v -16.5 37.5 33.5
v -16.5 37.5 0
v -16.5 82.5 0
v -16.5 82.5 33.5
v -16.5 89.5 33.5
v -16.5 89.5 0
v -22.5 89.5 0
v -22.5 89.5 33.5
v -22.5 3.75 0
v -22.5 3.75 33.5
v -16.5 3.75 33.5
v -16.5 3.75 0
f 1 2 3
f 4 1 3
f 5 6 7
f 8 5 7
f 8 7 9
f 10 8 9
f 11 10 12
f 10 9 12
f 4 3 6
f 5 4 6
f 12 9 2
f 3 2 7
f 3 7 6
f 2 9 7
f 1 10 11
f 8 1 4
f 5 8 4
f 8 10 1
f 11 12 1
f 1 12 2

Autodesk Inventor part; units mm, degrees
ref_plane "YZ Plane" through (0, 0, 0) normal (1, 0, 0) x (0, 1, 0)
ref_plane "XZ Plane" through (0, 0, 0) normal (0, 1, 0) x (-1, 0, 0)
ref_plane "Work Plane1" through (0, 0, 0) normal (0, 0, 1) x (1, 0, 0)
sketch "Sketch1" plane through (0, 0, 0) normal (0, 0, 1) x (1, 0, 0)
  line L0 (23.5, 89.5) -> (-23.5, 89.5) projected
  line L1 (-23.5, 89.5) -> (-23.5, 37.5) projected
  arc A0 (-26.5, 34.5) -> (-23.5, 37.5) centre (-26.5, 37.5) ccw projected
  line L2 (-26.5, 34.5) -> (-89, 34.5) projected
  line L3 (-89, 34.5) -> (-89, -69.5) projected
  line L4 (-89, -69.5) -> (-77, -69.5) projected
  arc A1 (-74, -72.5) -> (-77, -69.5) centre (-77, -72.5) ccw projected
  line L5 (-74, -72.5) -> (-74, -89.5) projected
  line L6 (-74, -89.5) -> (74, -89.5) projected
  line L7 (74, -89.5) -> (74, -72.5) projected
  arc A2 (77, -69.5) -> (74, -72.5) centre (77, -72.5) ccw projected
  line L8 (77, -69.5) -> (89, -69.5) projected
  line L9 (89, -69.5) -> (89, 34.5) projected
  line L10 (89, 34.5) -> (26.5, 34.5) projected
  arc A3 (23.5, 37.5) -> (26.5, 34.5) centre (26.5, 37.5) ccw projected
  line L11 (23.5, 37.5) -> (23.5, 89.5) projected
  line L12 (-4.5, 82.5) -> (-4.5, 37.5) projected
  arc A4 (-7.5, 34.5) -> (-4.5, 37.5) centre (-7.5, 37.5) ccw projected
  line L13 (-7.5, 34.5) -> (-13.5, 34.5) projected
  arc A5 (-16.5, 37.5) -> (-13.5, 34.5) centre (-13.5, 37.5) ccw projected
  line L14 (-16.5, 37.5) -> (-16.5, 82.5) projected
  arc A6 (-13.5, 85.5) -> (-16.5, 82.5) centre (-13.5, 82.5) ccw projected
  line L15 (-13.5, 85.5) -> (-7.5, 85.5) projected
  arc A7 (-4.5, 82.5) -> (-7.5, 85.5) centre (-7.5, 82.5) ccw projected
  line L16 (16.5, 82.5) -> (16.5, 37.5) projected
  arc A8 (13.5, 34.5) -> (16.5, 37.5) centre (13.5, 37.5) ccw projected
  line L17 (13.5, 34.5) -> (7.5, 34.5) projected
  arc A9 (4.5, 37.5) -> (7.5, 34.5) centre (7.5, 37.5) ccw projected
  line L18 (4.5, 37.5) -> (4.5, 82.5) projected
  arc A10 (7.5, 85.5) -> (4.5, 82.5) centre (7.5, 82.5) ccw projected
  line L19 (7.5, 85.5) -> (13.5, 85.5) projected
  arc A11 (16.5, 82.5) -> (13.5, 85.5) centre (13.5, 82.5) ccw projected
  line L20 (-16.5, 89.5) -> (-22.5, 89.5)
  line L21 (-22.5, 89.5) -> (-22.5, 3.75)
  line L22 (-22.5, 3.75) -> (-16.5, 3.75)
  line L23 (-16.5, 3.75) -> (-16.5, 89.5)
  line L24 (-32.2, 4.75) -> (-59.9, 4.75)
  point P0 (0, 0)
  dimension "d0" = 1
  dimension "d2" = 1
ref_plane "Work Plane2" through (-89, -40.3889, 33.5) normal (0, 0, 1) x (1, 0, 0)
extrude "Extrusion1" add sketch "Sketch1" along normal up to surface (33.5 mm away) contours L23 L14 L22 L21 L0
properties part number "right_gear_holder"
